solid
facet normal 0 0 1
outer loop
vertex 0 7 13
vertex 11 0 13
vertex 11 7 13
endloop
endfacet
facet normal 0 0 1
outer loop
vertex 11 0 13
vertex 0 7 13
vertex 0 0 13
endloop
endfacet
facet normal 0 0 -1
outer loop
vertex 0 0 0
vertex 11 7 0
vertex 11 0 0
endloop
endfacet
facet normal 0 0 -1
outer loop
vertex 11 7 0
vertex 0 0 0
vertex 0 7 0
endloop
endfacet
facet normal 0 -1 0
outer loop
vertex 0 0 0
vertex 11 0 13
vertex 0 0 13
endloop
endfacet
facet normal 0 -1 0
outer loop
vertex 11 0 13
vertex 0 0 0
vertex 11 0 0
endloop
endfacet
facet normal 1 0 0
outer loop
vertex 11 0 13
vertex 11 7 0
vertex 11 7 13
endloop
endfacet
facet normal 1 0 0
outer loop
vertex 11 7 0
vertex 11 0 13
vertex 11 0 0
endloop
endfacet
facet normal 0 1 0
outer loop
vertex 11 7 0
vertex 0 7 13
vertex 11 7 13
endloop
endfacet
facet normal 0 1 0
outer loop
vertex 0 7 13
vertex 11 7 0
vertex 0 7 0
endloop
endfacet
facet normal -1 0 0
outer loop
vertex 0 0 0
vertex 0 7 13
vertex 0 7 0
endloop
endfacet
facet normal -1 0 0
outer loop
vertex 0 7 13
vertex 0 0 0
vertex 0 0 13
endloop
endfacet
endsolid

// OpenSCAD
// Generated by SolidPython 1.0.1 on 2020-07-29 00:46:55


cube(size = [11, 7, 13]);
/***********************************************
*********      SolidPython code:      **********
************************************************
 
# import packages: SolidPython
from solid import *
from solid.utils import *
from itertools import chain, combinations, permutations


class Resize:

    def __init__(self, scad_file):
        self.scad_file = scad_file
        #self.scad_file = import_scad(scad_file)
        # cone/cylinder param:
        self.r1 = 0
        self.r2 = 0
        self.h = 0
        # rectangular prism param:
        self.w = 0
        self.l = 0
        # ellipse param:
        self.r = 0

    # import OpenScad code (file name corresponds to shape)


    # classify shape + parameters
    def assign(self, param1, param2, param3):
        if self.scad_file == 'cone.scad':
            self.r1 = param1
            self.r2 = param2
            self.h = param3
        elif self.scad_file == 'cylinder.scad':
            self.r1 = param1
            self.r2 = param2
            self.h = param3
        elif self.scad_file == 'rectangularPrism.scad':
            self.h = param1
            self.l = param2
            self.w = param3
        else:
            self.r = param1
            self.h = param2

    # resize parameters
    def iterate(self):
        x = range(3, 20, 2)
        i = 1
        if self.scad_file == 'cone.scad':
            tempList = list(permutations(x, 2))
            for temp in tempList:
                param1 = temp[0]
                param2 = temp[1]
                filepath = 'produced_scad_files/' + 'cone' + str(param1) + '_' + str(param2) + '_' + '.scad'
                scad_render_to_file(cylinder(h=param1, r1=param2, r2=0), filepath)

        elif self.scad_file == 'cylinder.scad':
            tempList = list(permutations(x, 3))
            for temp in tempList:
                param1 = temp[0]
                param2 = temp[1]
                filepath = 'produced_scad_files/' + 'cylinder' + str(param1) + '_' + str(param2) + '_' + '.scad'
                scad_render_to_file(cylinder(h=param1, r1=param2, r2=param2), filepath)

        elif self.scad_file == 'rectangularPrism.scad':
            tempList = list(permutations(x, 3))
            for temp in tempList:
                param1 = temp[0]
                param2 = temp[1]
                param3 = temp[2]
                filepath = 'produced_scad_files/' + 'rectangularPrism' + str(param1) + '_' + str(param2) + '_' + str(
                    param3) + '.scad'
                scad_render_to_file(cube(size=(param1, param2, param3)), filepath)

        elif self.scad_file == 'ellipse.scad':
            tempList = list(permutations(x, 4))
            for temp in tempList:
                param1 = temp[0]
                param2 = temp[1]
                param3 = temp[2]
                param4 = temp[3]
                filepath = 'produced_scad_files/' + 'ellipse' + str(param1) + '_' + str(param2) + '_' + str(param3) + '_' + str(param4) + '.scad'
                scad_render_to_file(scale([param1, param2, param3])(sphere(r=param4)), filepath)

    def render_to_scadfile(self):
        scad_render_to_file(scad, 'example.scad') 
 
************************************************/
